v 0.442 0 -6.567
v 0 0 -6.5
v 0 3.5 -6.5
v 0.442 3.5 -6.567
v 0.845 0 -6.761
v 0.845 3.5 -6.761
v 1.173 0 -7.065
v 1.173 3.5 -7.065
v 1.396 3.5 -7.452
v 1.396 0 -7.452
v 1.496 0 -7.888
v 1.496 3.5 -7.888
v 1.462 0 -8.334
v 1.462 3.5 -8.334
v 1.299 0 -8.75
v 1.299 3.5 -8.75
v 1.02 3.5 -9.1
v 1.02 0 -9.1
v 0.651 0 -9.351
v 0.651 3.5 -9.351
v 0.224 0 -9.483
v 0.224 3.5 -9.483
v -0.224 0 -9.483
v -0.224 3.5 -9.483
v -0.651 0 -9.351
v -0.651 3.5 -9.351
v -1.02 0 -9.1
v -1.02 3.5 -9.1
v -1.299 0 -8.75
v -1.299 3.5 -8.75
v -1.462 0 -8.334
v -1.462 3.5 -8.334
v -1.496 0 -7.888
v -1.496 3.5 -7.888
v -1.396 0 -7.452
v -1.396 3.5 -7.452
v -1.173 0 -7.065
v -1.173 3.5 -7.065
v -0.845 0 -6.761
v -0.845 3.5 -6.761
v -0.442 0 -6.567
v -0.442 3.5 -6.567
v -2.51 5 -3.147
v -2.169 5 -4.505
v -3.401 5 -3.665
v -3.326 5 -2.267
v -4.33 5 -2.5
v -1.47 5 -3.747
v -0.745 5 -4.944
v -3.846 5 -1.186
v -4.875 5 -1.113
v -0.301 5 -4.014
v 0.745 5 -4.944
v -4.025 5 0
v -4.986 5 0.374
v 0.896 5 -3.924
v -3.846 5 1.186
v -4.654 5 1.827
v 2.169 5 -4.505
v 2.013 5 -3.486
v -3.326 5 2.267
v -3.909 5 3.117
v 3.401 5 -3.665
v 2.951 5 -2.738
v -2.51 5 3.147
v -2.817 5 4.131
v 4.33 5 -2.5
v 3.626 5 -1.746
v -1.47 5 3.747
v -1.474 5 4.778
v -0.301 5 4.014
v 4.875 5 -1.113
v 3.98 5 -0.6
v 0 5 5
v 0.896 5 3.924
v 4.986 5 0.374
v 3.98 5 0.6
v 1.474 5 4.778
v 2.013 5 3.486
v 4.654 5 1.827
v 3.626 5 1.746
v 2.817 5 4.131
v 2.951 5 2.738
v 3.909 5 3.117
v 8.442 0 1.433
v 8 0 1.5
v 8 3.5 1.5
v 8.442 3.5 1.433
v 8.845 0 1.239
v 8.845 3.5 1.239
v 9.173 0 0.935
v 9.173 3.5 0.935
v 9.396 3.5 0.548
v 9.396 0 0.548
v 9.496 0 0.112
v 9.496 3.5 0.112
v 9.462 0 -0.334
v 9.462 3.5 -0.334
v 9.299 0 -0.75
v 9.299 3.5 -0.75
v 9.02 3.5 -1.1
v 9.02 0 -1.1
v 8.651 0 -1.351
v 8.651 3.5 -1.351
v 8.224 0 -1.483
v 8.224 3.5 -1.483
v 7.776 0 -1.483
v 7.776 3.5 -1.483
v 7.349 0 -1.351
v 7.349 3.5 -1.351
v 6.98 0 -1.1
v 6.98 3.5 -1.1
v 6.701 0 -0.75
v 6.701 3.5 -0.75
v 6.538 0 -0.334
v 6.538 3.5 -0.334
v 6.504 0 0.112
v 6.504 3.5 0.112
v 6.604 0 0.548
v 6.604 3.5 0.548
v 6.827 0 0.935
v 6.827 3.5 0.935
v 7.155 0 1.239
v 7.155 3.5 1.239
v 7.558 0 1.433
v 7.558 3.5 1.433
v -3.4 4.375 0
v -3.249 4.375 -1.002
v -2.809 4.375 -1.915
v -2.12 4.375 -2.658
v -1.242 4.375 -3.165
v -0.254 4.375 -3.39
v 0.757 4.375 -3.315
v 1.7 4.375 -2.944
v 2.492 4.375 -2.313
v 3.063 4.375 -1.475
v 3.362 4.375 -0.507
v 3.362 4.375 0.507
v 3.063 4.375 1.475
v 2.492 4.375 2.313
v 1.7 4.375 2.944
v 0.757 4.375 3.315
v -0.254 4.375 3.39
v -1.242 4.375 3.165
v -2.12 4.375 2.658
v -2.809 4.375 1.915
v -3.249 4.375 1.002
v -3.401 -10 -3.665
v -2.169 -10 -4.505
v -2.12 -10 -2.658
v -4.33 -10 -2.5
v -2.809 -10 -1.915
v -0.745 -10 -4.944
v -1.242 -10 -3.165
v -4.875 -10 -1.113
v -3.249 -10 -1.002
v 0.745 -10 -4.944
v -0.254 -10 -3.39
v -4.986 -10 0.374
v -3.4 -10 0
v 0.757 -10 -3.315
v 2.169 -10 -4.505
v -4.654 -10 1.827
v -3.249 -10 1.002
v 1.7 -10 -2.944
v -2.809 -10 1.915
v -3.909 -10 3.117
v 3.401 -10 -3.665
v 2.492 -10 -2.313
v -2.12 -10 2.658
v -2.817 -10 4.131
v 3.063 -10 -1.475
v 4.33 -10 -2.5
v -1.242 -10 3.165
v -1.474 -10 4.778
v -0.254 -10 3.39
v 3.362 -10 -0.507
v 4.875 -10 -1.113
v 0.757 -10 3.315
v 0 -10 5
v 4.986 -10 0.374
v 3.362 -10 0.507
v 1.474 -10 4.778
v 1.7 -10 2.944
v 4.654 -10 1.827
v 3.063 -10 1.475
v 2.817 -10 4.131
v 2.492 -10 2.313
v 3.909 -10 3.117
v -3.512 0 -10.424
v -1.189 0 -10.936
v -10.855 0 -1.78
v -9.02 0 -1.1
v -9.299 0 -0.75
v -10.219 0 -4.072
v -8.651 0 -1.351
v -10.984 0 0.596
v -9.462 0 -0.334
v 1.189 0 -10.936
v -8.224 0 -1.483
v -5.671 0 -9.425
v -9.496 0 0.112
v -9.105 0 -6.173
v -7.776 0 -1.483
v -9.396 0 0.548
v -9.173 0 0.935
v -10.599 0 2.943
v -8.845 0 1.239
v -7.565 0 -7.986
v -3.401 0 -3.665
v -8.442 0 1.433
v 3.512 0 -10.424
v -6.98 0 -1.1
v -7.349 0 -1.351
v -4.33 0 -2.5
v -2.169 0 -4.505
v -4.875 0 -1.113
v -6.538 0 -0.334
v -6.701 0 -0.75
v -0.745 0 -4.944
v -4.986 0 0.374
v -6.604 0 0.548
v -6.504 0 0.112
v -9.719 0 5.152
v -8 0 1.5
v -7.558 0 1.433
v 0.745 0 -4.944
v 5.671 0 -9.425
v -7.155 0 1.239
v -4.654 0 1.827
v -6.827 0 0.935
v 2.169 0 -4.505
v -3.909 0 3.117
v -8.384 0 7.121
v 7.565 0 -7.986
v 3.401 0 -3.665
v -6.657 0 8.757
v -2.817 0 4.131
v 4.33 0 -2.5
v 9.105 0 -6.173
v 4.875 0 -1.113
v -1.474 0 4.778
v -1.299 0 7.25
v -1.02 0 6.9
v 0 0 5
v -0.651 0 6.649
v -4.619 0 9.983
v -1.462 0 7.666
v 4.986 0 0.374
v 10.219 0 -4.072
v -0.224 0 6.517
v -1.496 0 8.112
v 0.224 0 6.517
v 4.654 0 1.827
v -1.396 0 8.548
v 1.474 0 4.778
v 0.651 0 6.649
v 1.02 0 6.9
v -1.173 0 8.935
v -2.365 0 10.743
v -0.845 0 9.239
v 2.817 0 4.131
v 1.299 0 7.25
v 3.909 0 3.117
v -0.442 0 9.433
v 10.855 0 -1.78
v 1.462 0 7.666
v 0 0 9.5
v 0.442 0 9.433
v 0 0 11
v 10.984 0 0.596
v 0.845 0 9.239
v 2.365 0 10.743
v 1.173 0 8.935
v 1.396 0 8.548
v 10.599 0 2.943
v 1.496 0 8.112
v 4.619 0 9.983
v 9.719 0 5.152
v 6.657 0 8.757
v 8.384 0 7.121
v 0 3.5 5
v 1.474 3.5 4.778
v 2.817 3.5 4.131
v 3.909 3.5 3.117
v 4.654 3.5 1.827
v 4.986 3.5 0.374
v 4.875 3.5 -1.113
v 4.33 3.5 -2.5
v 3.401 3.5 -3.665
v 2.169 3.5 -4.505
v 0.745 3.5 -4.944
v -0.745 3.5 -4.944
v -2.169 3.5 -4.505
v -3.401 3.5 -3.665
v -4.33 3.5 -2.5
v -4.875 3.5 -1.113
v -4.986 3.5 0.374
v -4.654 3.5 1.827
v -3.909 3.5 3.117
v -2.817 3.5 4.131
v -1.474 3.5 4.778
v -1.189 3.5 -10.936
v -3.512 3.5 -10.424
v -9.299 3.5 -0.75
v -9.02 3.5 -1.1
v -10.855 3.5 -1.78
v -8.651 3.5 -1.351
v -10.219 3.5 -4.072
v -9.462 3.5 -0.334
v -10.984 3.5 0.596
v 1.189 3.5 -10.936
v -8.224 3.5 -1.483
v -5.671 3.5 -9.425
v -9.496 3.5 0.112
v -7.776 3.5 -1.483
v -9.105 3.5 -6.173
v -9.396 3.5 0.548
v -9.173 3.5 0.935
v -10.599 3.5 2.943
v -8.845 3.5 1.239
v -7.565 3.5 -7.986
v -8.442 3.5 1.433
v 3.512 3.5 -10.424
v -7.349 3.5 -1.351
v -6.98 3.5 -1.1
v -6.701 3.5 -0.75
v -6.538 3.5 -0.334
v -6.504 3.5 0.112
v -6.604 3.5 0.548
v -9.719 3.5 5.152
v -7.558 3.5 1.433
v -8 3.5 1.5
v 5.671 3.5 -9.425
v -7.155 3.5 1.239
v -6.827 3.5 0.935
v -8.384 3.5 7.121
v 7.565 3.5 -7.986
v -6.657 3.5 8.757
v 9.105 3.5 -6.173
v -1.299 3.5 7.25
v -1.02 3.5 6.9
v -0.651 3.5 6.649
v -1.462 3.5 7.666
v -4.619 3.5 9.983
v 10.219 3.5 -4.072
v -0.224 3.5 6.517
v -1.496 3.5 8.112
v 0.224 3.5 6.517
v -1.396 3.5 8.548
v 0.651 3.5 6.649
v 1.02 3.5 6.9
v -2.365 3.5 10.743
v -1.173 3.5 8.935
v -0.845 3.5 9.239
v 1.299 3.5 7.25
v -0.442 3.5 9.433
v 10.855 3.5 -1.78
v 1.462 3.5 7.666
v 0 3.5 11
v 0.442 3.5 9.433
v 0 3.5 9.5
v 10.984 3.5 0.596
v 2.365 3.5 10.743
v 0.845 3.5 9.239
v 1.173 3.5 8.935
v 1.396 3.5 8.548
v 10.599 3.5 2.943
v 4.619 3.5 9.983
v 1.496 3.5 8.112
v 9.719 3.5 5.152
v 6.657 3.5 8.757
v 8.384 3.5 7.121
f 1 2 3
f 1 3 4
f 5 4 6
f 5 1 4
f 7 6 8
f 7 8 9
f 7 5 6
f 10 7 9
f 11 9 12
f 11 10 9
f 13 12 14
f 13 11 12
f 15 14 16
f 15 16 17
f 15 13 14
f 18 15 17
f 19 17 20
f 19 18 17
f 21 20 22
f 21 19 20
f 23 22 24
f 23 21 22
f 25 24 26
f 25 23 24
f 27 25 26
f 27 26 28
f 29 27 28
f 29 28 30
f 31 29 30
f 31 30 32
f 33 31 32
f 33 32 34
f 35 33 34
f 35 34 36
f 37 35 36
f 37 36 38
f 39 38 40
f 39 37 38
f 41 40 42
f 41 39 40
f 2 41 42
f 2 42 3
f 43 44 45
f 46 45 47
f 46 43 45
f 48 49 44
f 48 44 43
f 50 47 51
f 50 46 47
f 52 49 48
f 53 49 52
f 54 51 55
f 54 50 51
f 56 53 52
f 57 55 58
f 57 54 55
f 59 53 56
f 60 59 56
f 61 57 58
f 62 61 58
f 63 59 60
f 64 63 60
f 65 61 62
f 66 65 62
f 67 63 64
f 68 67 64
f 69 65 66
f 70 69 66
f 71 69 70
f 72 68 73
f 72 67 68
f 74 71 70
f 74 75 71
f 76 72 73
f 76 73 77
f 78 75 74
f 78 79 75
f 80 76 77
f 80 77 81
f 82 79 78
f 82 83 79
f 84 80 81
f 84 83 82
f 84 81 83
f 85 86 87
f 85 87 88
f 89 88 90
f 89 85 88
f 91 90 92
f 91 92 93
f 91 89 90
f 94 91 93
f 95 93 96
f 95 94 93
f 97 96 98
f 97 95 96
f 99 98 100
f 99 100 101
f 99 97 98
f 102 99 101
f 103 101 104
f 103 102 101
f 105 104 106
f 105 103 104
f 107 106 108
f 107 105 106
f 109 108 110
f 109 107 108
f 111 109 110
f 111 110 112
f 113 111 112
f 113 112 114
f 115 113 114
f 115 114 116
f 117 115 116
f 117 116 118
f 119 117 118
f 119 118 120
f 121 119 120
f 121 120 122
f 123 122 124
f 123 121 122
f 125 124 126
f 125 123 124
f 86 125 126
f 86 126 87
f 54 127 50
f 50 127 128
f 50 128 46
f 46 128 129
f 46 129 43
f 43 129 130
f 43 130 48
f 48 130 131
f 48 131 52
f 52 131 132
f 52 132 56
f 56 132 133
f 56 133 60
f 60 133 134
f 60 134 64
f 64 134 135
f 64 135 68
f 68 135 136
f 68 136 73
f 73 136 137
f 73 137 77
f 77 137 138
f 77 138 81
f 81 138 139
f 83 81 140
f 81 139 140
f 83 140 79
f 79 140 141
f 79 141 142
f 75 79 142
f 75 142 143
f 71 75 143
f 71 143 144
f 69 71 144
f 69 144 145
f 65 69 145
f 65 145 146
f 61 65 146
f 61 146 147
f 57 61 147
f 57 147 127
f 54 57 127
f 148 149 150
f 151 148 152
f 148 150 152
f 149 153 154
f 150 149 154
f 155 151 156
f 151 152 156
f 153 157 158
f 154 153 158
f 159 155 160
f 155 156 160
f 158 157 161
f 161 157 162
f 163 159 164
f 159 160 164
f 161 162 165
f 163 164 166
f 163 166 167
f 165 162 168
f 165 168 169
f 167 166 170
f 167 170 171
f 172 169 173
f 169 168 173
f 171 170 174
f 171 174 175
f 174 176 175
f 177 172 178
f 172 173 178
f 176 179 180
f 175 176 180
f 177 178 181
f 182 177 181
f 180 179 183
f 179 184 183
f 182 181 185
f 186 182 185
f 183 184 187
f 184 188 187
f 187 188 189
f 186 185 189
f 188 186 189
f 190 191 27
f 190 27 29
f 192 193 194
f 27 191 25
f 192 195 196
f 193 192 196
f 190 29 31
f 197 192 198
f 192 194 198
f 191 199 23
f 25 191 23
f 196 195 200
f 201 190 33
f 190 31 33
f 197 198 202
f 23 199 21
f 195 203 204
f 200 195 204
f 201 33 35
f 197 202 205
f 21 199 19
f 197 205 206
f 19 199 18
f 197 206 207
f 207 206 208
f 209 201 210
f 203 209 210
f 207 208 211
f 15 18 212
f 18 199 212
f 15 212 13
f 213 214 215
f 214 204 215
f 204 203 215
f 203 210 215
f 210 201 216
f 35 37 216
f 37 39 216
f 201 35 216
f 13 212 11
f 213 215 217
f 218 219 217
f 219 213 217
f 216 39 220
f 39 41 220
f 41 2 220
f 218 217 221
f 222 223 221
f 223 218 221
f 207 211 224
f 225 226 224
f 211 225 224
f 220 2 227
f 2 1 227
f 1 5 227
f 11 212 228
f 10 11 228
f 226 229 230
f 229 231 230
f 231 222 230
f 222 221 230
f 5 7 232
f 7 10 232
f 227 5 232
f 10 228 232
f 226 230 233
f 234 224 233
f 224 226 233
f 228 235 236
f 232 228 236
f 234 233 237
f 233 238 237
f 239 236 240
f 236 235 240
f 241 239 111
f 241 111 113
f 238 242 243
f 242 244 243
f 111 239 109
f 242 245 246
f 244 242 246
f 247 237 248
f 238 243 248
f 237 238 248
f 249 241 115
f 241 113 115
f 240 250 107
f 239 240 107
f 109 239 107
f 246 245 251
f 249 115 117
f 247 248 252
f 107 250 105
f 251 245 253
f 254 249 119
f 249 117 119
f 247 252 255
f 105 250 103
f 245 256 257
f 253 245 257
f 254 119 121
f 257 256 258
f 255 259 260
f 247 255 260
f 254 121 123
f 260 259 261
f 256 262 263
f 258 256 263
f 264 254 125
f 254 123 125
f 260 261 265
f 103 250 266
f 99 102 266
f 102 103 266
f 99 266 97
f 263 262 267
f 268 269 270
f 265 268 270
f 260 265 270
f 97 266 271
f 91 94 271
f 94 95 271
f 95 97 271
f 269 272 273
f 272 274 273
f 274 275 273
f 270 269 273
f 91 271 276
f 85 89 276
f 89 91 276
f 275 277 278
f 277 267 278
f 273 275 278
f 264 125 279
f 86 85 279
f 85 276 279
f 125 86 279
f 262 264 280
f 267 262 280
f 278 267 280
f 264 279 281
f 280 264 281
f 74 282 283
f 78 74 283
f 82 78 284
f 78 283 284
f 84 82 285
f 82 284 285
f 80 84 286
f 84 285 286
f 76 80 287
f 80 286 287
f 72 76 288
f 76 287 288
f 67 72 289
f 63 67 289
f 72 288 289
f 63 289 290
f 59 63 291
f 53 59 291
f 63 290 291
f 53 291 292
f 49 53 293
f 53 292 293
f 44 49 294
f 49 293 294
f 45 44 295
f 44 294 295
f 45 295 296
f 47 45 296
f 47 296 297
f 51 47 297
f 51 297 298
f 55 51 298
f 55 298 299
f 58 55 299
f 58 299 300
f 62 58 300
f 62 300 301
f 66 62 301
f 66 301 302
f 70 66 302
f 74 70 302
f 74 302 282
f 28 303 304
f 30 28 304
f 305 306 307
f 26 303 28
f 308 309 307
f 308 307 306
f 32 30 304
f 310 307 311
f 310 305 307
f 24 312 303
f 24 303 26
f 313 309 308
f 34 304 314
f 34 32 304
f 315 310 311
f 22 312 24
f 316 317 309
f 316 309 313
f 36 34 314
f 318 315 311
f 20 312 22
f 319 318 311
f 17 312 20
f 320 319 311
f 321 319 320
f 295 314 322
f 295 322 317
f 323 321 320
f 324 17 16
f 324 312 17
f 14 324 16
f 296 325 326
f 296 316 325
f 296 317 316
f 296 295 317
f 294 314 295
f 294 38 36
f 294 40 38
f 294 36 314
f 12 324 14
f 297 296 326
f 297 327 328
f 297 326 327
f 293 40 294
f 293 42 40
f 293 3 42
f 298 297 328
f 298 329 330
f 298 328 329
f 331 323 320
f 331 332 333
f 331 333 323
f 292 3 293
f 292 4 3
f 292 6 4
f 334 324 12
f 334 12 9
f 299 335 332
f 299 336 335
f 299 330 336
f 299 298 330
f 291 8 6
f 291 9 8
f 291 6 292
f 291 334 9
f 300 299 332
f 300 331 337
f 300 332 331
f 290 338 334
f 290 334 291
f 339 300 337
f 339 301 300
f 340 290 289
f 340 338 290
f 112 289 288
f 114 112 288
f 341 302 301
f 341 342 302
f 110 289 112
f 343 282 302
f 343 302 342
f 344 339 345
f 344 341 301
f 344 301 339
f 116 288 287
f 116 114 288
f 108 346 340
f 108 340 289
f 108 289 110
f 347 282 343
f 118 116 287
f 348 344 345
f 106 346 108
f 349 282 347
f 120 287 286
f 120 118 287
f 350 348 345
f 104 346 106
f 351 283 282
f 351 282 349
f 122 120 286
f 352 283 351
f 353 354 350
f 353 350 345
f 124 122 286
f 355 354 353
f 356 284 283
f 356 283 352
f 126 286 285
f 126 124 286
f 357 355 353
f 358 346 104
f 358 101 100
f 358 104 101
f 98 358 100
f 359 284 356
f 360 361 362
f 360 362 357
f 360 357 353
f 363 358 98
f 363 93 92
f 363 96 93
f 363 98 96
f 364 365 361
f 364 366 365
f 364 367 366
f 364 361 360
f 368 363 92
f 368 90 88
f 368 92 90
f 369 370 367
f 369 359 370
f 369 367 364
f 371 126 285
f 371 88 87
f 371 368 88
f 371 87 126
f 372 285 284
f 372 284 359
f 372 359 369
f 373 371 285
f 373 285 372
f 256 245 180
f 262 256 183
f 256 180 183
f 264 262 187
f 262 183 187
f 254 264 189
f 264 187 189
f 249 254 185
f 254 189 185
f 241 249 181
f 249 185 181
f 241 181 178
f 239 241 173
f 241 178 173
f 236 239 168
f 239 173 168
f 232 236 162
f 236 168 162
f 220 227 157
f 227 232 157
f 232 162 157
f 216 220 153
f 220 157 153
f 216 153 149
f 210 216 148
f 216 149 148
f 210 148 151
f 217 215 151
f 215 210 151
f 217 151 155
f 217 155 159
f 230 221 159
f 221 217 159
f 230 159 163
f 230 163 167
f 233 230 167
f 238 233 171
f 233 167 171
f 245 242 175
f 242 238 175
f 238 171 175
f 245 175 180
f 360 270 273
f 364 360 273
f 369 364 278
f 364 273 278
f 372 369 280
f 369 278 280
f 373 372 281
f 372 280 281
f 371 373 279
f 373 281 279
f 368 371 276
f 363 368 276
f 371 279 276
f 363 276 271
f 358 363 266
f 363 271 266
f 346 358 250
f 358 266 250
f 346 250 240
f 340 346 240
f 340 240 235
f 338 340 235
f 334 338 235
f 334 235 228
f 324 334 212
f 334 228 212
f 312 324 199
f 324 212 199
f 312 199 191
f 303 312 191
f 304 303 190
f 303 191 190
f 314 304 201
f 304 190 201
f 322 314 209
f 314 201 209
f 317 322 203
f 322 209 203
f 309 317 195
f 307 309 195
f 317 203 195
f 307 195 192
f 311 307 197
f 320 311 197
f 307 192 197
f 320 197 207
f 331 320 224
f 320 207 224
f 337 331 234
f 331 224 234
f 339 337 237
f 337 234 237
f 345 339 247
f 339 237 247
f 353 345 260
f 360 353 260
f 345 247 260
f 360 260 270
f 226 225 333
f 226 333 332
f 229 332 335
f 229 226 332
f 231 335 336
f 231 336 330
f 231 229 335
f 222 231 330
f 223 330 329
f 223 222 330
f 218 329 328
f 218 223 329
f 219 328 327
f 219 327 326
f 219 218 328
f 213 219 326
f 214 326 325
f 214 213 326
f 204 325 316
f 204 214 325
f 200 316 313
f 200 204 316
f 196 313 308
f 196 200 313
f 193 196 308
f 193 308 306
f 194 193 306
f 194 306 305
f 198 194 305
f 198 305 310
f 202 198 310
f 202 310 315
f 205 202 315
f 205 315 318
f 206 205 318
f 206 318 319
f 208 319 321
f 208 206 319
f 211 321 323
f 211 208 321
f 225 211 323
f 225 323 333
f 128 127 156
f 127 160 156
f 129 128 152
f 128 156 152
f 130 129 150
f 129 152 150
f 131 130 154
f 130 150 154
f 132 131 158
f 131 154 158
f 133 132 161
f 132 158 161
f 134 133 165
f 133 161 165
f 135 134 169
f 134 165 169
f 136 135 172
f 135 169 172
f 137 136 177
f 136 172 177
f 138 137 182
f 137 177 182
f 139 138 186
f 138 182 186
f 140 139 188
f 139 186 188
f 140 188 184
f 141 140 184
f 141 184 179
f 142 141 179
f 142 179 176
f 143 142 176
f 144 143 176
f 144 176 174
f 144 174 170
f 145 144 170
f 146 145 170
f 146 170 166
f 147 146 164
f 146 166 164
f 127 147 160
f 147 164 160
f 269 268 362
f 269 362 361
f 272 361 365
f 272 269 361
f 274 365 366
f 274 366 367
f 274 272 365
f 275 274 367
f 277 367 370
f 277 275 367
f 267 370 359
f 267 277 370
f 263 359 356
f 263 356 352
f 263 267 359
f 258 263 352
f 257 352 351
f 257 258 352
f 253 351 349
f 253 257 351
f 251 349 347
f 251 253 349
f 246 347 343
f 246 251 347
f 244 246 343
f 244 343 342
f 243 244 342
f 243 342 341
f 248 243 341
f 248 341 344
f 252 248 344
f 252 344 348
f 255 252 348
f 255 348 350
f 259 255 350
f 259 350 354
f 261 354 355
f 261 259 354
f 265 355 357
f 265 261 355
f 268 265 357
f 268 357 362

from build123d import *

# Parameters (mm, degrees)
EXTRUDE_2_DEPTH              = 5
EXTRUDE_2_DEPTH_BACK         = 10
SKETCH_1_R                   = 5
SKETCH_2_R                   = 11
SKETCH_2_R_2                 = 1.5
EXTRUDE_3_DEPTH              = 3.5
HOLE_WIZARD_M8_1_D           = 6.8
HOLE_WIZARD_M8_1_DEPTH       = 22.25
HOLE_WIZARD_M8_1_CSINK_D     = 8.05
HOLE_WIZARD_M8_1_CSINK_ANGLE = 90
HOLE_WIZARD_M8_1_TIP         = 2.042926105


with BuildPart() as part:
    # 草图1 → 凸台-拉伸2 (new, two sides: drawn at the far end of the back side and taken through both)
    with BuildSketch(Plane(origin=(0, 0, 0), x_dir=(1, 0, 0), z_dir=(0, 1, 0)).offset(-EXTRUDE_2_DEPTH_BACK)):
        with Locations(Location((0, 0, 0), (0, 0, 270))):
            Circle(SKETCH_1_R)
    extrude(amount=EXTRUDE_2_DEPTH + EXTRUDE_2_DEPTH_BACK)

    # 草图2 → 凸台-拉伸3 (add)
    with BuildSketch(Plane(origin=(0, 0, 0), x_dir=(1, 0, 0), z_dir=(0, 1, 0))):
        with Locations(Location((0, 0, 0), (0, 0, 270))):
            Circle(SKETCH_2_R)
        with Locations(Location((8, 0, 0), (0, 0, 270))):
            Circle(SKETCH_2_R_2, mode=Mode.SUBTRACT)
        with Locations(Location((0, 8, 0), (0, 0, 270))):
            Circle(SKETCH_2_R_2, mode=Mode.SUBTRACT)
        with Locations(Location((-8, 0, 0), (0, 0, 270))):
            Circle(SKETCH_2_R_2, mode=Mode.SUBTRACT)
        with Locations(Location((0, -8, 0), (0, 0, 270))):
            Circle(SKETCH_2_R_2, mode=Mode.SUBTRACT)
    extrude(amount=EXTRUDE_3_DEPTH)

    # M8 螺纹孔1
    with Locations(Plane(origin=(0, 5, 0), x_dir=(1, 0, 0), z_dir=(0, 1, 0))):
        with Locations((0, 0)):
            CounterSinkHole(HOLE_WIZARD_M8_1_D / 2, HOLE_WIZARD_M8_1_CSINK_D / 2, depth=HOLE_WIZARD_M8_1_DEPTH, counter_sink_angle=HOLE_WIZARD_M8_1_CSINK_ANGLE)
            with Locations((0, 0, -(HOLE_WIZARD_M8_1_DEPTH + HOLE_WIZARD_M8_1_TIP / 2))):  # 118° drill point
                Cone(0, HOLE_WIZARD_M8_1_D / 2, HOLE_WIZARD_M8_1_TIP, mode=Mode.SUBTRACT)


solid = part.part
